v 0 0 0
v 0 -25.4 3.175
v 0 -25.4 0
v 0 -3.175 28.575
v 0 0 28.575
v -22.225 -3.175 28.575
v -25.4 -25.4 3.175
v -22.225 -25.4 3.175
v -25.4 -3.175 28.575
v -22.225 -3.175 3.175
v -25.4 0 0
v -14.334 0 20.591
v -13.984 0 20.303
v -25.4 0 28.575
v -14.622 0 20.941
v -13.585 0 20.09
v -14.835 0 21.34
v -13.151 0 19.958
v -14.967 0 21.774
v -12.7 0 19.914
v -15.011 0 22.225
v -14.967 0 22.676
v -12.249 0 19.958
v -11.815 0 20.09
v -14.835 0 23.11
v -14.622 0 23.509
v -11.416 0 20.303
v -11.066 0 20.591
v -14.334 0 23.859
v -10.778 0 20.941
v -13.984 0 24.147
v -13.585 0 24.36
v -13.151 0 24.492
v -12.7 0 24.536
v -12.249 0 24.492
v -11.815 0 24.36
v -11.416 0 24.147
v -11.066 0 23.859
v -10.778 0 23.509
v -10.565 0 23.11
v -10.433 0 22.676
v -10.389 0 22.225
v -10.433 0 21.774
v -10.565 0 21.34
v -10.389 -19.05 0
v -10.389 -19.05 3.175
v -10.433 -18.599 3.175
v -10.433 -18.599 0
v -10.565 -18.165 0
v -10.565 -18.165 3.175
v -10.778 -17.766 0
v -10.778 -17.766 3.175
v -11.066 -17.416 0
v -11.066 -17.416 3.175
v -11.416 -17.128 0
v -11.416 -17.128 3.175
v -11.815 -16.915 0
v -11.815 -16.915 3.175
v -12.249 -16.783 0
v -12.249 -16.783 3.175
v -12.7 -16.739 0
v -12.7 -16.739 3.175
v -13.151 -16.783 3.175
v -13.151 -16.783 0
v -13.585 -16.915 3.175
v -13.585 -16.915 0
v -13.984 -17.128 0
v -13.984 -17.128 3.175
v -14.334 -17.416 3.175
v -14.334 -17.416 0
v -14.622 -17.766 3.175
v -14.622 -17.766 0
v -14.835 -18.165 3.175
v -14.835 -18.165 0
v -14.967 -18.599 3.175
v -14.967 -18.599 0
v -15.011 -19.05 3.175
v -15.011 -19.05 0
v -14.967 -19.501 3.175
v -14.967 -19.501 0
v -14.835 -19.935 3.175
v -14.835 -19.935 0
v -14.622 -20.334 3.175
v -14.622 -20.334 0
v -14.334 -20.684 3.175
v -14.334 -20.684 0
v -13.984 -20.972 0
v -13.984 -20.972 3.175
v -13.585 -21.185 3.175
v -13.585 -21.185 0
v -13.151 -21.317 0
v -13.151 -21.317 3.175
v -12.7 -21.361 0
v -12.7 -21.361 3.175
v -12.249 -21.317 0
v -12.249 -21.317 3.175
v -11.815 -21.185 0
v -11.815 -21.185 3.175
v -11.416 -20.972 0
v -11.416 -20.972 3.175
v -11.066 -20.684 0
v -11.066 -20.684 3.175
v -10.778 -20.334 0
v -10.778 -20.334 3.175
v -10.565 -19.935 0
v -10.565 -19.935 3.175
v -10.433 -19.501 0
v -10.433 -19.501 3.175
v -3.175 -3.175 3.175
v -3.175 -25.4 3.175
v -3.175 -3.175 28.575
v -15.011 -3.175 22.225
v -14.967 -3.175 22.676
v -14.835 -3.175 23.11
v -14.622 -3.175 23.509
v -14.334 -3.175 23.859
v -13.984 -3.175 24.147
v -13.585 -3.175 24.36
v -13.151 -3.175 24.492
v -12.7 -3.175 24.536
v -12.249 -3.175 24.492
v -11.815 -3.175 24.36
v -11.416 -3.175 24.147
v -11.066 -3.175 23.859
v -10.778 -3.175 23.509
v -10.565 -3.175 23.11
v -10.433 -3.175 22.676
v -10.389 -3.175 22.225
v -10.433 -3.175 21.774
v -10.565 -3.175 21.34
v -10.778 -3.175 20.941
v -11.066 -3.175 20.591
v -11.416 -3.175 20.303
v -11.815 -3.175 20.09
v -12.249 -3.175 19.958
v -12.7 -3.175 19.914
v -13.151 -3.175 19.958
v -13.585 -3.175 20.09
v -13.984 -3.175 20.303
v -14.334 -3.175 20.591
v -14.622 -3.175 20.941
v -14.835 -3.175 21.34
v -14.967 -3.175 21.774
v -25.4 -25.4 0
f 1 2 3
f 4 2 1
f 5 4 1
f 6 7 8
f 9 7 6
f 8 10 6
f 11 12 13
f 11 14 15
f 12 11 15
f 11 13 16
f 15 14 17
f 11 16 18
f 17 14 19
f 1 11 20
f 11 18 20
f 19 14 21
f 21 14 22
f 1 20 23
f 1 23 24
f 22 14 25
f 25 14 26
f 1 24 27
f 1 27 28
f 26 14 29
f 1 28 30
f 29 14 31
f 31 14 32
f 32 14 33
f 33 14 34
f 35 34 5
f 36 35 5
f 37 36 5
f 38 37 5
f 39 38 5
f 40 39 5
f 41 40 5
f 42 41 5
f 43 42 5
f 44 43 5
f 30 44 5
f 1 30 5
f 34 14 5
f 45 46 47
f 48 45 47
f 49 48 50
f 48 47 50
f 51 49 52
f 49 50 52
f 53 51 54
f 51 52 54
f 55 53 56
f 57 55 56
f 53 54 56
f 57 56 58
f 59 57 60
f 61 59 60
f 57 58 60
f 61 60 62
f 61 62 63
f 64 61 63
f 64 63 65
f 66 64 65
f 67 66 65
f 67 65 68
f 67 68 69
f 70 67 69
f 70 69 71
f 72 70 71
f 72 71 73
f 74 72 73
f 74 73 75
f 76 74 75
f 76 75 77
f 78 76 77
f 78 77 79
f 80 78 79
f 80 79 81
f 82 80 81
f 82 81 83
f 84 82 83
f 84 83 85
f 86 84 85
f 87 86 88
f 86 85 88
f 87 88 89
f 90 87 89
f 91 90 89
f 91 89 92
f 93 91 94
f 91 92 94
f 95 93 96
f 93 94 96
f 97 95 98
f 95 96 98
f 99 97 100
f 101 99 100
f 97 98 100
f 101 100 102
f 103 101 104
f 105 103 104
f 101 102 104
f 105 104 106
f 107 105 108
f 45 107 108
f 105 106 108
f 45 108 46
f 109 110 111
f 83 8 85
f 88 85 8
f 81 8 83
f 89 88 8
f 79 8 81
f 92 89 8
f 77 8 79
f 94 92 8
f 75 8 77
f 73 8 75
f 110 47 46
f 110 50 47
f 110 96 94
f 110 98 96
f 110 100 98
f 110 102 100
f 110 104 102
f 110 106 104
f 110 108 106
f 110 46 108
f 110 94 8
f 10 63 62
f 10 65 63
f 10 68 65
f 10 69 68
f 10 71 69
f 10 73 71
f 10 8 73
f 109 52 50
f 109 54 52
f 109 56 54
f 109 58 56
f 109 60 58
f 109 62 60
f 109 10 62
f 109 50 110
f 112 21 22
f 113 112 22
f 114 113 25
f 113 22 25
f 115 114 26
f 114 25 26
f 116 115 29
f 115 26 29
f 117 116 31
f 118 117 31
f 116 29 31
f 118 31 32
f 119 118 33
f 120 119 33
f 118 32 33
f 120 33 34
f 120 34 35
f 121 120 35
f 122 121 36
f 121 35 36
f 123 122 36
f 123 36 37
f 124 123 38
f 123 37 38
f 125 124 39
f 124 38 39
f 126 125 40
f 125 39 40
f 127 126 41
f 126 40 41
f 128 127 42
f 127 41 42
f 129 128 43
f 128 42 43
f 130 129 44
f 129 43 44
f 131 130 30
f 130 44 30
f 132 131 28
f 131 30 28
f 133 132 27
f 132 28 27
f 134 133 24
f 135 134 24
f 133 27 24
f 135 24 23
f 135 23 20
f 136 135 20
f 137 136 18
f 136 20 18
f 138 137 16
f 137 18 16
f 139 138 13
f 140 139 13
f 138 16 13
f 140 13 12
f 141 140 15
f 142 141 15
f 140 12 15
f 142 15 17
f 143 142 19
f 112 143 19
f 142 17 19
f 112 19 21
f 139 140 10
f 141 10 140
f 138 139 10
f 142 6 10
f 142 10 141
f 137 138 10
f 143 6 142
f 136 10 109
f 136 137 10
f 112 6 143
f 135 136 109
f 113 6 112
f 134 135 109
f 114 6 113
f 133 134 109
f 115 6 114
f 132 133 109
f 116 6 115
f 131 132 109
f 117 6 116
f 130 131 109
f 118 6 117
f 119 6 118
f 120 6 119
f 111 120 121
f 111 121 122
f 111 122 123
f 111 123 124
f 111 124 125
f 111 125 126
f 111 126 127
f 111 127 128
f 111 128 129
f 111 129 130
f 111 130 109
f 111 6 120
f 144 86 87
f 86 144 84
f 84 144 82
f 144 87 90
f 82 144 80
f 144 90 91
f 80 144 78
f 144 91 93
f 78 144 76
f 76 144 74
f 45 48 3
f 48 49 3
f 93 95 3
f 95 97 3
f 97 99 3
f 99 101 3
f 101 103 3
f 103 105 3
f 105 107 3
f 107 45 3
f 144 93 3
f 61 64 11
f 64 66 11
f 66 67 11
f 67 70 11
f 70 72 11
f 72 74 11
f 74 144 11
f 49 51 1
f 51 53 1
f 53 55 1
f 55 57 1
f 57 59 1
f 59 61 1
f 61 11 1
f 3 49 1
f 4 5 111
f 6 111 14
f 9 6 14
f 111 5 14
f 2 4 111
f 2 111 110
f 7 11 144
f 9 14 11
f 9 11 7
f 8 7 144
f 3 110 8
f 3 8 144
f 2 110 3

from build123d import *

# Parameters (mm, degrees)
F1_DEPTH = 3.175
F2_W     = 25.4
F2_H     = 3.175
F3_DEPTH = 22.225
F4_R     = 2.3114
F5_DEPTH = 25.4
F7_DEPTH = 3.175
F9_DEPTH = 3.175


with BuildPart() as f1:
    # F0 (on Front) → F1 (new body)
    with BuildSketch(Plane.XZ):
        Polygon((-25.4, 0), (0, 0), (0, 28.575), (-25.4, 28.575), (-25.4, 22.225), (-25.4, 3.175), align=None)
        with BuildLine():
            ThreePointArc((-10.3886, 22.225), (-12.7, 19.9136), (-15.0114, 22.225))
            ThreePointArc((-15.0114, 22.225), (-12.7, 24.5364), (-10.3886, 22.225))
        make_face(mode=Mode.SUBTRACT)
    extrude(amount=F1_DEPTH)

    # F2 (on face) → F3 (join)
    with BuildSketch(Plane.XZ.offset(3.175)):
        with Locations((-12.7, 1.5875)):
            Rectangle(F2_W, F2_H)
    extrude(amount=F3_DEPTH)

    # F4 (on face) → F5 (cut)
    with BuildSketch(Plane.XY.offset(3.175)):
        with Locations((-12.7, -19.05)):
            Circle(F4_R)
    extrude(amount=-F5_DEPTH, mode=Mode.SUBTRACT)

    # F6 (on face) → F7 (join)
    with BuildSketch(Plane.YZ):
        Polygon((-3.175, 28.575), (-25.4, 3.175), (-3.175, 3.175), align=None)
    extrude(amount=-F7_DEPTH)

    # F8 (on face) → F9 (join)
    with BuildSketch(Plane(origin=(-25.4, 0, 0), x_dir=(0, -1, 0), z_dir=(-1, 0, 0))):
        Polygon((3.175, 3.175), (25.4, 3.175), (3.175, 28.575), align=None)
    extrude(amount=-F9_DEPTH)


solid = f1.part
